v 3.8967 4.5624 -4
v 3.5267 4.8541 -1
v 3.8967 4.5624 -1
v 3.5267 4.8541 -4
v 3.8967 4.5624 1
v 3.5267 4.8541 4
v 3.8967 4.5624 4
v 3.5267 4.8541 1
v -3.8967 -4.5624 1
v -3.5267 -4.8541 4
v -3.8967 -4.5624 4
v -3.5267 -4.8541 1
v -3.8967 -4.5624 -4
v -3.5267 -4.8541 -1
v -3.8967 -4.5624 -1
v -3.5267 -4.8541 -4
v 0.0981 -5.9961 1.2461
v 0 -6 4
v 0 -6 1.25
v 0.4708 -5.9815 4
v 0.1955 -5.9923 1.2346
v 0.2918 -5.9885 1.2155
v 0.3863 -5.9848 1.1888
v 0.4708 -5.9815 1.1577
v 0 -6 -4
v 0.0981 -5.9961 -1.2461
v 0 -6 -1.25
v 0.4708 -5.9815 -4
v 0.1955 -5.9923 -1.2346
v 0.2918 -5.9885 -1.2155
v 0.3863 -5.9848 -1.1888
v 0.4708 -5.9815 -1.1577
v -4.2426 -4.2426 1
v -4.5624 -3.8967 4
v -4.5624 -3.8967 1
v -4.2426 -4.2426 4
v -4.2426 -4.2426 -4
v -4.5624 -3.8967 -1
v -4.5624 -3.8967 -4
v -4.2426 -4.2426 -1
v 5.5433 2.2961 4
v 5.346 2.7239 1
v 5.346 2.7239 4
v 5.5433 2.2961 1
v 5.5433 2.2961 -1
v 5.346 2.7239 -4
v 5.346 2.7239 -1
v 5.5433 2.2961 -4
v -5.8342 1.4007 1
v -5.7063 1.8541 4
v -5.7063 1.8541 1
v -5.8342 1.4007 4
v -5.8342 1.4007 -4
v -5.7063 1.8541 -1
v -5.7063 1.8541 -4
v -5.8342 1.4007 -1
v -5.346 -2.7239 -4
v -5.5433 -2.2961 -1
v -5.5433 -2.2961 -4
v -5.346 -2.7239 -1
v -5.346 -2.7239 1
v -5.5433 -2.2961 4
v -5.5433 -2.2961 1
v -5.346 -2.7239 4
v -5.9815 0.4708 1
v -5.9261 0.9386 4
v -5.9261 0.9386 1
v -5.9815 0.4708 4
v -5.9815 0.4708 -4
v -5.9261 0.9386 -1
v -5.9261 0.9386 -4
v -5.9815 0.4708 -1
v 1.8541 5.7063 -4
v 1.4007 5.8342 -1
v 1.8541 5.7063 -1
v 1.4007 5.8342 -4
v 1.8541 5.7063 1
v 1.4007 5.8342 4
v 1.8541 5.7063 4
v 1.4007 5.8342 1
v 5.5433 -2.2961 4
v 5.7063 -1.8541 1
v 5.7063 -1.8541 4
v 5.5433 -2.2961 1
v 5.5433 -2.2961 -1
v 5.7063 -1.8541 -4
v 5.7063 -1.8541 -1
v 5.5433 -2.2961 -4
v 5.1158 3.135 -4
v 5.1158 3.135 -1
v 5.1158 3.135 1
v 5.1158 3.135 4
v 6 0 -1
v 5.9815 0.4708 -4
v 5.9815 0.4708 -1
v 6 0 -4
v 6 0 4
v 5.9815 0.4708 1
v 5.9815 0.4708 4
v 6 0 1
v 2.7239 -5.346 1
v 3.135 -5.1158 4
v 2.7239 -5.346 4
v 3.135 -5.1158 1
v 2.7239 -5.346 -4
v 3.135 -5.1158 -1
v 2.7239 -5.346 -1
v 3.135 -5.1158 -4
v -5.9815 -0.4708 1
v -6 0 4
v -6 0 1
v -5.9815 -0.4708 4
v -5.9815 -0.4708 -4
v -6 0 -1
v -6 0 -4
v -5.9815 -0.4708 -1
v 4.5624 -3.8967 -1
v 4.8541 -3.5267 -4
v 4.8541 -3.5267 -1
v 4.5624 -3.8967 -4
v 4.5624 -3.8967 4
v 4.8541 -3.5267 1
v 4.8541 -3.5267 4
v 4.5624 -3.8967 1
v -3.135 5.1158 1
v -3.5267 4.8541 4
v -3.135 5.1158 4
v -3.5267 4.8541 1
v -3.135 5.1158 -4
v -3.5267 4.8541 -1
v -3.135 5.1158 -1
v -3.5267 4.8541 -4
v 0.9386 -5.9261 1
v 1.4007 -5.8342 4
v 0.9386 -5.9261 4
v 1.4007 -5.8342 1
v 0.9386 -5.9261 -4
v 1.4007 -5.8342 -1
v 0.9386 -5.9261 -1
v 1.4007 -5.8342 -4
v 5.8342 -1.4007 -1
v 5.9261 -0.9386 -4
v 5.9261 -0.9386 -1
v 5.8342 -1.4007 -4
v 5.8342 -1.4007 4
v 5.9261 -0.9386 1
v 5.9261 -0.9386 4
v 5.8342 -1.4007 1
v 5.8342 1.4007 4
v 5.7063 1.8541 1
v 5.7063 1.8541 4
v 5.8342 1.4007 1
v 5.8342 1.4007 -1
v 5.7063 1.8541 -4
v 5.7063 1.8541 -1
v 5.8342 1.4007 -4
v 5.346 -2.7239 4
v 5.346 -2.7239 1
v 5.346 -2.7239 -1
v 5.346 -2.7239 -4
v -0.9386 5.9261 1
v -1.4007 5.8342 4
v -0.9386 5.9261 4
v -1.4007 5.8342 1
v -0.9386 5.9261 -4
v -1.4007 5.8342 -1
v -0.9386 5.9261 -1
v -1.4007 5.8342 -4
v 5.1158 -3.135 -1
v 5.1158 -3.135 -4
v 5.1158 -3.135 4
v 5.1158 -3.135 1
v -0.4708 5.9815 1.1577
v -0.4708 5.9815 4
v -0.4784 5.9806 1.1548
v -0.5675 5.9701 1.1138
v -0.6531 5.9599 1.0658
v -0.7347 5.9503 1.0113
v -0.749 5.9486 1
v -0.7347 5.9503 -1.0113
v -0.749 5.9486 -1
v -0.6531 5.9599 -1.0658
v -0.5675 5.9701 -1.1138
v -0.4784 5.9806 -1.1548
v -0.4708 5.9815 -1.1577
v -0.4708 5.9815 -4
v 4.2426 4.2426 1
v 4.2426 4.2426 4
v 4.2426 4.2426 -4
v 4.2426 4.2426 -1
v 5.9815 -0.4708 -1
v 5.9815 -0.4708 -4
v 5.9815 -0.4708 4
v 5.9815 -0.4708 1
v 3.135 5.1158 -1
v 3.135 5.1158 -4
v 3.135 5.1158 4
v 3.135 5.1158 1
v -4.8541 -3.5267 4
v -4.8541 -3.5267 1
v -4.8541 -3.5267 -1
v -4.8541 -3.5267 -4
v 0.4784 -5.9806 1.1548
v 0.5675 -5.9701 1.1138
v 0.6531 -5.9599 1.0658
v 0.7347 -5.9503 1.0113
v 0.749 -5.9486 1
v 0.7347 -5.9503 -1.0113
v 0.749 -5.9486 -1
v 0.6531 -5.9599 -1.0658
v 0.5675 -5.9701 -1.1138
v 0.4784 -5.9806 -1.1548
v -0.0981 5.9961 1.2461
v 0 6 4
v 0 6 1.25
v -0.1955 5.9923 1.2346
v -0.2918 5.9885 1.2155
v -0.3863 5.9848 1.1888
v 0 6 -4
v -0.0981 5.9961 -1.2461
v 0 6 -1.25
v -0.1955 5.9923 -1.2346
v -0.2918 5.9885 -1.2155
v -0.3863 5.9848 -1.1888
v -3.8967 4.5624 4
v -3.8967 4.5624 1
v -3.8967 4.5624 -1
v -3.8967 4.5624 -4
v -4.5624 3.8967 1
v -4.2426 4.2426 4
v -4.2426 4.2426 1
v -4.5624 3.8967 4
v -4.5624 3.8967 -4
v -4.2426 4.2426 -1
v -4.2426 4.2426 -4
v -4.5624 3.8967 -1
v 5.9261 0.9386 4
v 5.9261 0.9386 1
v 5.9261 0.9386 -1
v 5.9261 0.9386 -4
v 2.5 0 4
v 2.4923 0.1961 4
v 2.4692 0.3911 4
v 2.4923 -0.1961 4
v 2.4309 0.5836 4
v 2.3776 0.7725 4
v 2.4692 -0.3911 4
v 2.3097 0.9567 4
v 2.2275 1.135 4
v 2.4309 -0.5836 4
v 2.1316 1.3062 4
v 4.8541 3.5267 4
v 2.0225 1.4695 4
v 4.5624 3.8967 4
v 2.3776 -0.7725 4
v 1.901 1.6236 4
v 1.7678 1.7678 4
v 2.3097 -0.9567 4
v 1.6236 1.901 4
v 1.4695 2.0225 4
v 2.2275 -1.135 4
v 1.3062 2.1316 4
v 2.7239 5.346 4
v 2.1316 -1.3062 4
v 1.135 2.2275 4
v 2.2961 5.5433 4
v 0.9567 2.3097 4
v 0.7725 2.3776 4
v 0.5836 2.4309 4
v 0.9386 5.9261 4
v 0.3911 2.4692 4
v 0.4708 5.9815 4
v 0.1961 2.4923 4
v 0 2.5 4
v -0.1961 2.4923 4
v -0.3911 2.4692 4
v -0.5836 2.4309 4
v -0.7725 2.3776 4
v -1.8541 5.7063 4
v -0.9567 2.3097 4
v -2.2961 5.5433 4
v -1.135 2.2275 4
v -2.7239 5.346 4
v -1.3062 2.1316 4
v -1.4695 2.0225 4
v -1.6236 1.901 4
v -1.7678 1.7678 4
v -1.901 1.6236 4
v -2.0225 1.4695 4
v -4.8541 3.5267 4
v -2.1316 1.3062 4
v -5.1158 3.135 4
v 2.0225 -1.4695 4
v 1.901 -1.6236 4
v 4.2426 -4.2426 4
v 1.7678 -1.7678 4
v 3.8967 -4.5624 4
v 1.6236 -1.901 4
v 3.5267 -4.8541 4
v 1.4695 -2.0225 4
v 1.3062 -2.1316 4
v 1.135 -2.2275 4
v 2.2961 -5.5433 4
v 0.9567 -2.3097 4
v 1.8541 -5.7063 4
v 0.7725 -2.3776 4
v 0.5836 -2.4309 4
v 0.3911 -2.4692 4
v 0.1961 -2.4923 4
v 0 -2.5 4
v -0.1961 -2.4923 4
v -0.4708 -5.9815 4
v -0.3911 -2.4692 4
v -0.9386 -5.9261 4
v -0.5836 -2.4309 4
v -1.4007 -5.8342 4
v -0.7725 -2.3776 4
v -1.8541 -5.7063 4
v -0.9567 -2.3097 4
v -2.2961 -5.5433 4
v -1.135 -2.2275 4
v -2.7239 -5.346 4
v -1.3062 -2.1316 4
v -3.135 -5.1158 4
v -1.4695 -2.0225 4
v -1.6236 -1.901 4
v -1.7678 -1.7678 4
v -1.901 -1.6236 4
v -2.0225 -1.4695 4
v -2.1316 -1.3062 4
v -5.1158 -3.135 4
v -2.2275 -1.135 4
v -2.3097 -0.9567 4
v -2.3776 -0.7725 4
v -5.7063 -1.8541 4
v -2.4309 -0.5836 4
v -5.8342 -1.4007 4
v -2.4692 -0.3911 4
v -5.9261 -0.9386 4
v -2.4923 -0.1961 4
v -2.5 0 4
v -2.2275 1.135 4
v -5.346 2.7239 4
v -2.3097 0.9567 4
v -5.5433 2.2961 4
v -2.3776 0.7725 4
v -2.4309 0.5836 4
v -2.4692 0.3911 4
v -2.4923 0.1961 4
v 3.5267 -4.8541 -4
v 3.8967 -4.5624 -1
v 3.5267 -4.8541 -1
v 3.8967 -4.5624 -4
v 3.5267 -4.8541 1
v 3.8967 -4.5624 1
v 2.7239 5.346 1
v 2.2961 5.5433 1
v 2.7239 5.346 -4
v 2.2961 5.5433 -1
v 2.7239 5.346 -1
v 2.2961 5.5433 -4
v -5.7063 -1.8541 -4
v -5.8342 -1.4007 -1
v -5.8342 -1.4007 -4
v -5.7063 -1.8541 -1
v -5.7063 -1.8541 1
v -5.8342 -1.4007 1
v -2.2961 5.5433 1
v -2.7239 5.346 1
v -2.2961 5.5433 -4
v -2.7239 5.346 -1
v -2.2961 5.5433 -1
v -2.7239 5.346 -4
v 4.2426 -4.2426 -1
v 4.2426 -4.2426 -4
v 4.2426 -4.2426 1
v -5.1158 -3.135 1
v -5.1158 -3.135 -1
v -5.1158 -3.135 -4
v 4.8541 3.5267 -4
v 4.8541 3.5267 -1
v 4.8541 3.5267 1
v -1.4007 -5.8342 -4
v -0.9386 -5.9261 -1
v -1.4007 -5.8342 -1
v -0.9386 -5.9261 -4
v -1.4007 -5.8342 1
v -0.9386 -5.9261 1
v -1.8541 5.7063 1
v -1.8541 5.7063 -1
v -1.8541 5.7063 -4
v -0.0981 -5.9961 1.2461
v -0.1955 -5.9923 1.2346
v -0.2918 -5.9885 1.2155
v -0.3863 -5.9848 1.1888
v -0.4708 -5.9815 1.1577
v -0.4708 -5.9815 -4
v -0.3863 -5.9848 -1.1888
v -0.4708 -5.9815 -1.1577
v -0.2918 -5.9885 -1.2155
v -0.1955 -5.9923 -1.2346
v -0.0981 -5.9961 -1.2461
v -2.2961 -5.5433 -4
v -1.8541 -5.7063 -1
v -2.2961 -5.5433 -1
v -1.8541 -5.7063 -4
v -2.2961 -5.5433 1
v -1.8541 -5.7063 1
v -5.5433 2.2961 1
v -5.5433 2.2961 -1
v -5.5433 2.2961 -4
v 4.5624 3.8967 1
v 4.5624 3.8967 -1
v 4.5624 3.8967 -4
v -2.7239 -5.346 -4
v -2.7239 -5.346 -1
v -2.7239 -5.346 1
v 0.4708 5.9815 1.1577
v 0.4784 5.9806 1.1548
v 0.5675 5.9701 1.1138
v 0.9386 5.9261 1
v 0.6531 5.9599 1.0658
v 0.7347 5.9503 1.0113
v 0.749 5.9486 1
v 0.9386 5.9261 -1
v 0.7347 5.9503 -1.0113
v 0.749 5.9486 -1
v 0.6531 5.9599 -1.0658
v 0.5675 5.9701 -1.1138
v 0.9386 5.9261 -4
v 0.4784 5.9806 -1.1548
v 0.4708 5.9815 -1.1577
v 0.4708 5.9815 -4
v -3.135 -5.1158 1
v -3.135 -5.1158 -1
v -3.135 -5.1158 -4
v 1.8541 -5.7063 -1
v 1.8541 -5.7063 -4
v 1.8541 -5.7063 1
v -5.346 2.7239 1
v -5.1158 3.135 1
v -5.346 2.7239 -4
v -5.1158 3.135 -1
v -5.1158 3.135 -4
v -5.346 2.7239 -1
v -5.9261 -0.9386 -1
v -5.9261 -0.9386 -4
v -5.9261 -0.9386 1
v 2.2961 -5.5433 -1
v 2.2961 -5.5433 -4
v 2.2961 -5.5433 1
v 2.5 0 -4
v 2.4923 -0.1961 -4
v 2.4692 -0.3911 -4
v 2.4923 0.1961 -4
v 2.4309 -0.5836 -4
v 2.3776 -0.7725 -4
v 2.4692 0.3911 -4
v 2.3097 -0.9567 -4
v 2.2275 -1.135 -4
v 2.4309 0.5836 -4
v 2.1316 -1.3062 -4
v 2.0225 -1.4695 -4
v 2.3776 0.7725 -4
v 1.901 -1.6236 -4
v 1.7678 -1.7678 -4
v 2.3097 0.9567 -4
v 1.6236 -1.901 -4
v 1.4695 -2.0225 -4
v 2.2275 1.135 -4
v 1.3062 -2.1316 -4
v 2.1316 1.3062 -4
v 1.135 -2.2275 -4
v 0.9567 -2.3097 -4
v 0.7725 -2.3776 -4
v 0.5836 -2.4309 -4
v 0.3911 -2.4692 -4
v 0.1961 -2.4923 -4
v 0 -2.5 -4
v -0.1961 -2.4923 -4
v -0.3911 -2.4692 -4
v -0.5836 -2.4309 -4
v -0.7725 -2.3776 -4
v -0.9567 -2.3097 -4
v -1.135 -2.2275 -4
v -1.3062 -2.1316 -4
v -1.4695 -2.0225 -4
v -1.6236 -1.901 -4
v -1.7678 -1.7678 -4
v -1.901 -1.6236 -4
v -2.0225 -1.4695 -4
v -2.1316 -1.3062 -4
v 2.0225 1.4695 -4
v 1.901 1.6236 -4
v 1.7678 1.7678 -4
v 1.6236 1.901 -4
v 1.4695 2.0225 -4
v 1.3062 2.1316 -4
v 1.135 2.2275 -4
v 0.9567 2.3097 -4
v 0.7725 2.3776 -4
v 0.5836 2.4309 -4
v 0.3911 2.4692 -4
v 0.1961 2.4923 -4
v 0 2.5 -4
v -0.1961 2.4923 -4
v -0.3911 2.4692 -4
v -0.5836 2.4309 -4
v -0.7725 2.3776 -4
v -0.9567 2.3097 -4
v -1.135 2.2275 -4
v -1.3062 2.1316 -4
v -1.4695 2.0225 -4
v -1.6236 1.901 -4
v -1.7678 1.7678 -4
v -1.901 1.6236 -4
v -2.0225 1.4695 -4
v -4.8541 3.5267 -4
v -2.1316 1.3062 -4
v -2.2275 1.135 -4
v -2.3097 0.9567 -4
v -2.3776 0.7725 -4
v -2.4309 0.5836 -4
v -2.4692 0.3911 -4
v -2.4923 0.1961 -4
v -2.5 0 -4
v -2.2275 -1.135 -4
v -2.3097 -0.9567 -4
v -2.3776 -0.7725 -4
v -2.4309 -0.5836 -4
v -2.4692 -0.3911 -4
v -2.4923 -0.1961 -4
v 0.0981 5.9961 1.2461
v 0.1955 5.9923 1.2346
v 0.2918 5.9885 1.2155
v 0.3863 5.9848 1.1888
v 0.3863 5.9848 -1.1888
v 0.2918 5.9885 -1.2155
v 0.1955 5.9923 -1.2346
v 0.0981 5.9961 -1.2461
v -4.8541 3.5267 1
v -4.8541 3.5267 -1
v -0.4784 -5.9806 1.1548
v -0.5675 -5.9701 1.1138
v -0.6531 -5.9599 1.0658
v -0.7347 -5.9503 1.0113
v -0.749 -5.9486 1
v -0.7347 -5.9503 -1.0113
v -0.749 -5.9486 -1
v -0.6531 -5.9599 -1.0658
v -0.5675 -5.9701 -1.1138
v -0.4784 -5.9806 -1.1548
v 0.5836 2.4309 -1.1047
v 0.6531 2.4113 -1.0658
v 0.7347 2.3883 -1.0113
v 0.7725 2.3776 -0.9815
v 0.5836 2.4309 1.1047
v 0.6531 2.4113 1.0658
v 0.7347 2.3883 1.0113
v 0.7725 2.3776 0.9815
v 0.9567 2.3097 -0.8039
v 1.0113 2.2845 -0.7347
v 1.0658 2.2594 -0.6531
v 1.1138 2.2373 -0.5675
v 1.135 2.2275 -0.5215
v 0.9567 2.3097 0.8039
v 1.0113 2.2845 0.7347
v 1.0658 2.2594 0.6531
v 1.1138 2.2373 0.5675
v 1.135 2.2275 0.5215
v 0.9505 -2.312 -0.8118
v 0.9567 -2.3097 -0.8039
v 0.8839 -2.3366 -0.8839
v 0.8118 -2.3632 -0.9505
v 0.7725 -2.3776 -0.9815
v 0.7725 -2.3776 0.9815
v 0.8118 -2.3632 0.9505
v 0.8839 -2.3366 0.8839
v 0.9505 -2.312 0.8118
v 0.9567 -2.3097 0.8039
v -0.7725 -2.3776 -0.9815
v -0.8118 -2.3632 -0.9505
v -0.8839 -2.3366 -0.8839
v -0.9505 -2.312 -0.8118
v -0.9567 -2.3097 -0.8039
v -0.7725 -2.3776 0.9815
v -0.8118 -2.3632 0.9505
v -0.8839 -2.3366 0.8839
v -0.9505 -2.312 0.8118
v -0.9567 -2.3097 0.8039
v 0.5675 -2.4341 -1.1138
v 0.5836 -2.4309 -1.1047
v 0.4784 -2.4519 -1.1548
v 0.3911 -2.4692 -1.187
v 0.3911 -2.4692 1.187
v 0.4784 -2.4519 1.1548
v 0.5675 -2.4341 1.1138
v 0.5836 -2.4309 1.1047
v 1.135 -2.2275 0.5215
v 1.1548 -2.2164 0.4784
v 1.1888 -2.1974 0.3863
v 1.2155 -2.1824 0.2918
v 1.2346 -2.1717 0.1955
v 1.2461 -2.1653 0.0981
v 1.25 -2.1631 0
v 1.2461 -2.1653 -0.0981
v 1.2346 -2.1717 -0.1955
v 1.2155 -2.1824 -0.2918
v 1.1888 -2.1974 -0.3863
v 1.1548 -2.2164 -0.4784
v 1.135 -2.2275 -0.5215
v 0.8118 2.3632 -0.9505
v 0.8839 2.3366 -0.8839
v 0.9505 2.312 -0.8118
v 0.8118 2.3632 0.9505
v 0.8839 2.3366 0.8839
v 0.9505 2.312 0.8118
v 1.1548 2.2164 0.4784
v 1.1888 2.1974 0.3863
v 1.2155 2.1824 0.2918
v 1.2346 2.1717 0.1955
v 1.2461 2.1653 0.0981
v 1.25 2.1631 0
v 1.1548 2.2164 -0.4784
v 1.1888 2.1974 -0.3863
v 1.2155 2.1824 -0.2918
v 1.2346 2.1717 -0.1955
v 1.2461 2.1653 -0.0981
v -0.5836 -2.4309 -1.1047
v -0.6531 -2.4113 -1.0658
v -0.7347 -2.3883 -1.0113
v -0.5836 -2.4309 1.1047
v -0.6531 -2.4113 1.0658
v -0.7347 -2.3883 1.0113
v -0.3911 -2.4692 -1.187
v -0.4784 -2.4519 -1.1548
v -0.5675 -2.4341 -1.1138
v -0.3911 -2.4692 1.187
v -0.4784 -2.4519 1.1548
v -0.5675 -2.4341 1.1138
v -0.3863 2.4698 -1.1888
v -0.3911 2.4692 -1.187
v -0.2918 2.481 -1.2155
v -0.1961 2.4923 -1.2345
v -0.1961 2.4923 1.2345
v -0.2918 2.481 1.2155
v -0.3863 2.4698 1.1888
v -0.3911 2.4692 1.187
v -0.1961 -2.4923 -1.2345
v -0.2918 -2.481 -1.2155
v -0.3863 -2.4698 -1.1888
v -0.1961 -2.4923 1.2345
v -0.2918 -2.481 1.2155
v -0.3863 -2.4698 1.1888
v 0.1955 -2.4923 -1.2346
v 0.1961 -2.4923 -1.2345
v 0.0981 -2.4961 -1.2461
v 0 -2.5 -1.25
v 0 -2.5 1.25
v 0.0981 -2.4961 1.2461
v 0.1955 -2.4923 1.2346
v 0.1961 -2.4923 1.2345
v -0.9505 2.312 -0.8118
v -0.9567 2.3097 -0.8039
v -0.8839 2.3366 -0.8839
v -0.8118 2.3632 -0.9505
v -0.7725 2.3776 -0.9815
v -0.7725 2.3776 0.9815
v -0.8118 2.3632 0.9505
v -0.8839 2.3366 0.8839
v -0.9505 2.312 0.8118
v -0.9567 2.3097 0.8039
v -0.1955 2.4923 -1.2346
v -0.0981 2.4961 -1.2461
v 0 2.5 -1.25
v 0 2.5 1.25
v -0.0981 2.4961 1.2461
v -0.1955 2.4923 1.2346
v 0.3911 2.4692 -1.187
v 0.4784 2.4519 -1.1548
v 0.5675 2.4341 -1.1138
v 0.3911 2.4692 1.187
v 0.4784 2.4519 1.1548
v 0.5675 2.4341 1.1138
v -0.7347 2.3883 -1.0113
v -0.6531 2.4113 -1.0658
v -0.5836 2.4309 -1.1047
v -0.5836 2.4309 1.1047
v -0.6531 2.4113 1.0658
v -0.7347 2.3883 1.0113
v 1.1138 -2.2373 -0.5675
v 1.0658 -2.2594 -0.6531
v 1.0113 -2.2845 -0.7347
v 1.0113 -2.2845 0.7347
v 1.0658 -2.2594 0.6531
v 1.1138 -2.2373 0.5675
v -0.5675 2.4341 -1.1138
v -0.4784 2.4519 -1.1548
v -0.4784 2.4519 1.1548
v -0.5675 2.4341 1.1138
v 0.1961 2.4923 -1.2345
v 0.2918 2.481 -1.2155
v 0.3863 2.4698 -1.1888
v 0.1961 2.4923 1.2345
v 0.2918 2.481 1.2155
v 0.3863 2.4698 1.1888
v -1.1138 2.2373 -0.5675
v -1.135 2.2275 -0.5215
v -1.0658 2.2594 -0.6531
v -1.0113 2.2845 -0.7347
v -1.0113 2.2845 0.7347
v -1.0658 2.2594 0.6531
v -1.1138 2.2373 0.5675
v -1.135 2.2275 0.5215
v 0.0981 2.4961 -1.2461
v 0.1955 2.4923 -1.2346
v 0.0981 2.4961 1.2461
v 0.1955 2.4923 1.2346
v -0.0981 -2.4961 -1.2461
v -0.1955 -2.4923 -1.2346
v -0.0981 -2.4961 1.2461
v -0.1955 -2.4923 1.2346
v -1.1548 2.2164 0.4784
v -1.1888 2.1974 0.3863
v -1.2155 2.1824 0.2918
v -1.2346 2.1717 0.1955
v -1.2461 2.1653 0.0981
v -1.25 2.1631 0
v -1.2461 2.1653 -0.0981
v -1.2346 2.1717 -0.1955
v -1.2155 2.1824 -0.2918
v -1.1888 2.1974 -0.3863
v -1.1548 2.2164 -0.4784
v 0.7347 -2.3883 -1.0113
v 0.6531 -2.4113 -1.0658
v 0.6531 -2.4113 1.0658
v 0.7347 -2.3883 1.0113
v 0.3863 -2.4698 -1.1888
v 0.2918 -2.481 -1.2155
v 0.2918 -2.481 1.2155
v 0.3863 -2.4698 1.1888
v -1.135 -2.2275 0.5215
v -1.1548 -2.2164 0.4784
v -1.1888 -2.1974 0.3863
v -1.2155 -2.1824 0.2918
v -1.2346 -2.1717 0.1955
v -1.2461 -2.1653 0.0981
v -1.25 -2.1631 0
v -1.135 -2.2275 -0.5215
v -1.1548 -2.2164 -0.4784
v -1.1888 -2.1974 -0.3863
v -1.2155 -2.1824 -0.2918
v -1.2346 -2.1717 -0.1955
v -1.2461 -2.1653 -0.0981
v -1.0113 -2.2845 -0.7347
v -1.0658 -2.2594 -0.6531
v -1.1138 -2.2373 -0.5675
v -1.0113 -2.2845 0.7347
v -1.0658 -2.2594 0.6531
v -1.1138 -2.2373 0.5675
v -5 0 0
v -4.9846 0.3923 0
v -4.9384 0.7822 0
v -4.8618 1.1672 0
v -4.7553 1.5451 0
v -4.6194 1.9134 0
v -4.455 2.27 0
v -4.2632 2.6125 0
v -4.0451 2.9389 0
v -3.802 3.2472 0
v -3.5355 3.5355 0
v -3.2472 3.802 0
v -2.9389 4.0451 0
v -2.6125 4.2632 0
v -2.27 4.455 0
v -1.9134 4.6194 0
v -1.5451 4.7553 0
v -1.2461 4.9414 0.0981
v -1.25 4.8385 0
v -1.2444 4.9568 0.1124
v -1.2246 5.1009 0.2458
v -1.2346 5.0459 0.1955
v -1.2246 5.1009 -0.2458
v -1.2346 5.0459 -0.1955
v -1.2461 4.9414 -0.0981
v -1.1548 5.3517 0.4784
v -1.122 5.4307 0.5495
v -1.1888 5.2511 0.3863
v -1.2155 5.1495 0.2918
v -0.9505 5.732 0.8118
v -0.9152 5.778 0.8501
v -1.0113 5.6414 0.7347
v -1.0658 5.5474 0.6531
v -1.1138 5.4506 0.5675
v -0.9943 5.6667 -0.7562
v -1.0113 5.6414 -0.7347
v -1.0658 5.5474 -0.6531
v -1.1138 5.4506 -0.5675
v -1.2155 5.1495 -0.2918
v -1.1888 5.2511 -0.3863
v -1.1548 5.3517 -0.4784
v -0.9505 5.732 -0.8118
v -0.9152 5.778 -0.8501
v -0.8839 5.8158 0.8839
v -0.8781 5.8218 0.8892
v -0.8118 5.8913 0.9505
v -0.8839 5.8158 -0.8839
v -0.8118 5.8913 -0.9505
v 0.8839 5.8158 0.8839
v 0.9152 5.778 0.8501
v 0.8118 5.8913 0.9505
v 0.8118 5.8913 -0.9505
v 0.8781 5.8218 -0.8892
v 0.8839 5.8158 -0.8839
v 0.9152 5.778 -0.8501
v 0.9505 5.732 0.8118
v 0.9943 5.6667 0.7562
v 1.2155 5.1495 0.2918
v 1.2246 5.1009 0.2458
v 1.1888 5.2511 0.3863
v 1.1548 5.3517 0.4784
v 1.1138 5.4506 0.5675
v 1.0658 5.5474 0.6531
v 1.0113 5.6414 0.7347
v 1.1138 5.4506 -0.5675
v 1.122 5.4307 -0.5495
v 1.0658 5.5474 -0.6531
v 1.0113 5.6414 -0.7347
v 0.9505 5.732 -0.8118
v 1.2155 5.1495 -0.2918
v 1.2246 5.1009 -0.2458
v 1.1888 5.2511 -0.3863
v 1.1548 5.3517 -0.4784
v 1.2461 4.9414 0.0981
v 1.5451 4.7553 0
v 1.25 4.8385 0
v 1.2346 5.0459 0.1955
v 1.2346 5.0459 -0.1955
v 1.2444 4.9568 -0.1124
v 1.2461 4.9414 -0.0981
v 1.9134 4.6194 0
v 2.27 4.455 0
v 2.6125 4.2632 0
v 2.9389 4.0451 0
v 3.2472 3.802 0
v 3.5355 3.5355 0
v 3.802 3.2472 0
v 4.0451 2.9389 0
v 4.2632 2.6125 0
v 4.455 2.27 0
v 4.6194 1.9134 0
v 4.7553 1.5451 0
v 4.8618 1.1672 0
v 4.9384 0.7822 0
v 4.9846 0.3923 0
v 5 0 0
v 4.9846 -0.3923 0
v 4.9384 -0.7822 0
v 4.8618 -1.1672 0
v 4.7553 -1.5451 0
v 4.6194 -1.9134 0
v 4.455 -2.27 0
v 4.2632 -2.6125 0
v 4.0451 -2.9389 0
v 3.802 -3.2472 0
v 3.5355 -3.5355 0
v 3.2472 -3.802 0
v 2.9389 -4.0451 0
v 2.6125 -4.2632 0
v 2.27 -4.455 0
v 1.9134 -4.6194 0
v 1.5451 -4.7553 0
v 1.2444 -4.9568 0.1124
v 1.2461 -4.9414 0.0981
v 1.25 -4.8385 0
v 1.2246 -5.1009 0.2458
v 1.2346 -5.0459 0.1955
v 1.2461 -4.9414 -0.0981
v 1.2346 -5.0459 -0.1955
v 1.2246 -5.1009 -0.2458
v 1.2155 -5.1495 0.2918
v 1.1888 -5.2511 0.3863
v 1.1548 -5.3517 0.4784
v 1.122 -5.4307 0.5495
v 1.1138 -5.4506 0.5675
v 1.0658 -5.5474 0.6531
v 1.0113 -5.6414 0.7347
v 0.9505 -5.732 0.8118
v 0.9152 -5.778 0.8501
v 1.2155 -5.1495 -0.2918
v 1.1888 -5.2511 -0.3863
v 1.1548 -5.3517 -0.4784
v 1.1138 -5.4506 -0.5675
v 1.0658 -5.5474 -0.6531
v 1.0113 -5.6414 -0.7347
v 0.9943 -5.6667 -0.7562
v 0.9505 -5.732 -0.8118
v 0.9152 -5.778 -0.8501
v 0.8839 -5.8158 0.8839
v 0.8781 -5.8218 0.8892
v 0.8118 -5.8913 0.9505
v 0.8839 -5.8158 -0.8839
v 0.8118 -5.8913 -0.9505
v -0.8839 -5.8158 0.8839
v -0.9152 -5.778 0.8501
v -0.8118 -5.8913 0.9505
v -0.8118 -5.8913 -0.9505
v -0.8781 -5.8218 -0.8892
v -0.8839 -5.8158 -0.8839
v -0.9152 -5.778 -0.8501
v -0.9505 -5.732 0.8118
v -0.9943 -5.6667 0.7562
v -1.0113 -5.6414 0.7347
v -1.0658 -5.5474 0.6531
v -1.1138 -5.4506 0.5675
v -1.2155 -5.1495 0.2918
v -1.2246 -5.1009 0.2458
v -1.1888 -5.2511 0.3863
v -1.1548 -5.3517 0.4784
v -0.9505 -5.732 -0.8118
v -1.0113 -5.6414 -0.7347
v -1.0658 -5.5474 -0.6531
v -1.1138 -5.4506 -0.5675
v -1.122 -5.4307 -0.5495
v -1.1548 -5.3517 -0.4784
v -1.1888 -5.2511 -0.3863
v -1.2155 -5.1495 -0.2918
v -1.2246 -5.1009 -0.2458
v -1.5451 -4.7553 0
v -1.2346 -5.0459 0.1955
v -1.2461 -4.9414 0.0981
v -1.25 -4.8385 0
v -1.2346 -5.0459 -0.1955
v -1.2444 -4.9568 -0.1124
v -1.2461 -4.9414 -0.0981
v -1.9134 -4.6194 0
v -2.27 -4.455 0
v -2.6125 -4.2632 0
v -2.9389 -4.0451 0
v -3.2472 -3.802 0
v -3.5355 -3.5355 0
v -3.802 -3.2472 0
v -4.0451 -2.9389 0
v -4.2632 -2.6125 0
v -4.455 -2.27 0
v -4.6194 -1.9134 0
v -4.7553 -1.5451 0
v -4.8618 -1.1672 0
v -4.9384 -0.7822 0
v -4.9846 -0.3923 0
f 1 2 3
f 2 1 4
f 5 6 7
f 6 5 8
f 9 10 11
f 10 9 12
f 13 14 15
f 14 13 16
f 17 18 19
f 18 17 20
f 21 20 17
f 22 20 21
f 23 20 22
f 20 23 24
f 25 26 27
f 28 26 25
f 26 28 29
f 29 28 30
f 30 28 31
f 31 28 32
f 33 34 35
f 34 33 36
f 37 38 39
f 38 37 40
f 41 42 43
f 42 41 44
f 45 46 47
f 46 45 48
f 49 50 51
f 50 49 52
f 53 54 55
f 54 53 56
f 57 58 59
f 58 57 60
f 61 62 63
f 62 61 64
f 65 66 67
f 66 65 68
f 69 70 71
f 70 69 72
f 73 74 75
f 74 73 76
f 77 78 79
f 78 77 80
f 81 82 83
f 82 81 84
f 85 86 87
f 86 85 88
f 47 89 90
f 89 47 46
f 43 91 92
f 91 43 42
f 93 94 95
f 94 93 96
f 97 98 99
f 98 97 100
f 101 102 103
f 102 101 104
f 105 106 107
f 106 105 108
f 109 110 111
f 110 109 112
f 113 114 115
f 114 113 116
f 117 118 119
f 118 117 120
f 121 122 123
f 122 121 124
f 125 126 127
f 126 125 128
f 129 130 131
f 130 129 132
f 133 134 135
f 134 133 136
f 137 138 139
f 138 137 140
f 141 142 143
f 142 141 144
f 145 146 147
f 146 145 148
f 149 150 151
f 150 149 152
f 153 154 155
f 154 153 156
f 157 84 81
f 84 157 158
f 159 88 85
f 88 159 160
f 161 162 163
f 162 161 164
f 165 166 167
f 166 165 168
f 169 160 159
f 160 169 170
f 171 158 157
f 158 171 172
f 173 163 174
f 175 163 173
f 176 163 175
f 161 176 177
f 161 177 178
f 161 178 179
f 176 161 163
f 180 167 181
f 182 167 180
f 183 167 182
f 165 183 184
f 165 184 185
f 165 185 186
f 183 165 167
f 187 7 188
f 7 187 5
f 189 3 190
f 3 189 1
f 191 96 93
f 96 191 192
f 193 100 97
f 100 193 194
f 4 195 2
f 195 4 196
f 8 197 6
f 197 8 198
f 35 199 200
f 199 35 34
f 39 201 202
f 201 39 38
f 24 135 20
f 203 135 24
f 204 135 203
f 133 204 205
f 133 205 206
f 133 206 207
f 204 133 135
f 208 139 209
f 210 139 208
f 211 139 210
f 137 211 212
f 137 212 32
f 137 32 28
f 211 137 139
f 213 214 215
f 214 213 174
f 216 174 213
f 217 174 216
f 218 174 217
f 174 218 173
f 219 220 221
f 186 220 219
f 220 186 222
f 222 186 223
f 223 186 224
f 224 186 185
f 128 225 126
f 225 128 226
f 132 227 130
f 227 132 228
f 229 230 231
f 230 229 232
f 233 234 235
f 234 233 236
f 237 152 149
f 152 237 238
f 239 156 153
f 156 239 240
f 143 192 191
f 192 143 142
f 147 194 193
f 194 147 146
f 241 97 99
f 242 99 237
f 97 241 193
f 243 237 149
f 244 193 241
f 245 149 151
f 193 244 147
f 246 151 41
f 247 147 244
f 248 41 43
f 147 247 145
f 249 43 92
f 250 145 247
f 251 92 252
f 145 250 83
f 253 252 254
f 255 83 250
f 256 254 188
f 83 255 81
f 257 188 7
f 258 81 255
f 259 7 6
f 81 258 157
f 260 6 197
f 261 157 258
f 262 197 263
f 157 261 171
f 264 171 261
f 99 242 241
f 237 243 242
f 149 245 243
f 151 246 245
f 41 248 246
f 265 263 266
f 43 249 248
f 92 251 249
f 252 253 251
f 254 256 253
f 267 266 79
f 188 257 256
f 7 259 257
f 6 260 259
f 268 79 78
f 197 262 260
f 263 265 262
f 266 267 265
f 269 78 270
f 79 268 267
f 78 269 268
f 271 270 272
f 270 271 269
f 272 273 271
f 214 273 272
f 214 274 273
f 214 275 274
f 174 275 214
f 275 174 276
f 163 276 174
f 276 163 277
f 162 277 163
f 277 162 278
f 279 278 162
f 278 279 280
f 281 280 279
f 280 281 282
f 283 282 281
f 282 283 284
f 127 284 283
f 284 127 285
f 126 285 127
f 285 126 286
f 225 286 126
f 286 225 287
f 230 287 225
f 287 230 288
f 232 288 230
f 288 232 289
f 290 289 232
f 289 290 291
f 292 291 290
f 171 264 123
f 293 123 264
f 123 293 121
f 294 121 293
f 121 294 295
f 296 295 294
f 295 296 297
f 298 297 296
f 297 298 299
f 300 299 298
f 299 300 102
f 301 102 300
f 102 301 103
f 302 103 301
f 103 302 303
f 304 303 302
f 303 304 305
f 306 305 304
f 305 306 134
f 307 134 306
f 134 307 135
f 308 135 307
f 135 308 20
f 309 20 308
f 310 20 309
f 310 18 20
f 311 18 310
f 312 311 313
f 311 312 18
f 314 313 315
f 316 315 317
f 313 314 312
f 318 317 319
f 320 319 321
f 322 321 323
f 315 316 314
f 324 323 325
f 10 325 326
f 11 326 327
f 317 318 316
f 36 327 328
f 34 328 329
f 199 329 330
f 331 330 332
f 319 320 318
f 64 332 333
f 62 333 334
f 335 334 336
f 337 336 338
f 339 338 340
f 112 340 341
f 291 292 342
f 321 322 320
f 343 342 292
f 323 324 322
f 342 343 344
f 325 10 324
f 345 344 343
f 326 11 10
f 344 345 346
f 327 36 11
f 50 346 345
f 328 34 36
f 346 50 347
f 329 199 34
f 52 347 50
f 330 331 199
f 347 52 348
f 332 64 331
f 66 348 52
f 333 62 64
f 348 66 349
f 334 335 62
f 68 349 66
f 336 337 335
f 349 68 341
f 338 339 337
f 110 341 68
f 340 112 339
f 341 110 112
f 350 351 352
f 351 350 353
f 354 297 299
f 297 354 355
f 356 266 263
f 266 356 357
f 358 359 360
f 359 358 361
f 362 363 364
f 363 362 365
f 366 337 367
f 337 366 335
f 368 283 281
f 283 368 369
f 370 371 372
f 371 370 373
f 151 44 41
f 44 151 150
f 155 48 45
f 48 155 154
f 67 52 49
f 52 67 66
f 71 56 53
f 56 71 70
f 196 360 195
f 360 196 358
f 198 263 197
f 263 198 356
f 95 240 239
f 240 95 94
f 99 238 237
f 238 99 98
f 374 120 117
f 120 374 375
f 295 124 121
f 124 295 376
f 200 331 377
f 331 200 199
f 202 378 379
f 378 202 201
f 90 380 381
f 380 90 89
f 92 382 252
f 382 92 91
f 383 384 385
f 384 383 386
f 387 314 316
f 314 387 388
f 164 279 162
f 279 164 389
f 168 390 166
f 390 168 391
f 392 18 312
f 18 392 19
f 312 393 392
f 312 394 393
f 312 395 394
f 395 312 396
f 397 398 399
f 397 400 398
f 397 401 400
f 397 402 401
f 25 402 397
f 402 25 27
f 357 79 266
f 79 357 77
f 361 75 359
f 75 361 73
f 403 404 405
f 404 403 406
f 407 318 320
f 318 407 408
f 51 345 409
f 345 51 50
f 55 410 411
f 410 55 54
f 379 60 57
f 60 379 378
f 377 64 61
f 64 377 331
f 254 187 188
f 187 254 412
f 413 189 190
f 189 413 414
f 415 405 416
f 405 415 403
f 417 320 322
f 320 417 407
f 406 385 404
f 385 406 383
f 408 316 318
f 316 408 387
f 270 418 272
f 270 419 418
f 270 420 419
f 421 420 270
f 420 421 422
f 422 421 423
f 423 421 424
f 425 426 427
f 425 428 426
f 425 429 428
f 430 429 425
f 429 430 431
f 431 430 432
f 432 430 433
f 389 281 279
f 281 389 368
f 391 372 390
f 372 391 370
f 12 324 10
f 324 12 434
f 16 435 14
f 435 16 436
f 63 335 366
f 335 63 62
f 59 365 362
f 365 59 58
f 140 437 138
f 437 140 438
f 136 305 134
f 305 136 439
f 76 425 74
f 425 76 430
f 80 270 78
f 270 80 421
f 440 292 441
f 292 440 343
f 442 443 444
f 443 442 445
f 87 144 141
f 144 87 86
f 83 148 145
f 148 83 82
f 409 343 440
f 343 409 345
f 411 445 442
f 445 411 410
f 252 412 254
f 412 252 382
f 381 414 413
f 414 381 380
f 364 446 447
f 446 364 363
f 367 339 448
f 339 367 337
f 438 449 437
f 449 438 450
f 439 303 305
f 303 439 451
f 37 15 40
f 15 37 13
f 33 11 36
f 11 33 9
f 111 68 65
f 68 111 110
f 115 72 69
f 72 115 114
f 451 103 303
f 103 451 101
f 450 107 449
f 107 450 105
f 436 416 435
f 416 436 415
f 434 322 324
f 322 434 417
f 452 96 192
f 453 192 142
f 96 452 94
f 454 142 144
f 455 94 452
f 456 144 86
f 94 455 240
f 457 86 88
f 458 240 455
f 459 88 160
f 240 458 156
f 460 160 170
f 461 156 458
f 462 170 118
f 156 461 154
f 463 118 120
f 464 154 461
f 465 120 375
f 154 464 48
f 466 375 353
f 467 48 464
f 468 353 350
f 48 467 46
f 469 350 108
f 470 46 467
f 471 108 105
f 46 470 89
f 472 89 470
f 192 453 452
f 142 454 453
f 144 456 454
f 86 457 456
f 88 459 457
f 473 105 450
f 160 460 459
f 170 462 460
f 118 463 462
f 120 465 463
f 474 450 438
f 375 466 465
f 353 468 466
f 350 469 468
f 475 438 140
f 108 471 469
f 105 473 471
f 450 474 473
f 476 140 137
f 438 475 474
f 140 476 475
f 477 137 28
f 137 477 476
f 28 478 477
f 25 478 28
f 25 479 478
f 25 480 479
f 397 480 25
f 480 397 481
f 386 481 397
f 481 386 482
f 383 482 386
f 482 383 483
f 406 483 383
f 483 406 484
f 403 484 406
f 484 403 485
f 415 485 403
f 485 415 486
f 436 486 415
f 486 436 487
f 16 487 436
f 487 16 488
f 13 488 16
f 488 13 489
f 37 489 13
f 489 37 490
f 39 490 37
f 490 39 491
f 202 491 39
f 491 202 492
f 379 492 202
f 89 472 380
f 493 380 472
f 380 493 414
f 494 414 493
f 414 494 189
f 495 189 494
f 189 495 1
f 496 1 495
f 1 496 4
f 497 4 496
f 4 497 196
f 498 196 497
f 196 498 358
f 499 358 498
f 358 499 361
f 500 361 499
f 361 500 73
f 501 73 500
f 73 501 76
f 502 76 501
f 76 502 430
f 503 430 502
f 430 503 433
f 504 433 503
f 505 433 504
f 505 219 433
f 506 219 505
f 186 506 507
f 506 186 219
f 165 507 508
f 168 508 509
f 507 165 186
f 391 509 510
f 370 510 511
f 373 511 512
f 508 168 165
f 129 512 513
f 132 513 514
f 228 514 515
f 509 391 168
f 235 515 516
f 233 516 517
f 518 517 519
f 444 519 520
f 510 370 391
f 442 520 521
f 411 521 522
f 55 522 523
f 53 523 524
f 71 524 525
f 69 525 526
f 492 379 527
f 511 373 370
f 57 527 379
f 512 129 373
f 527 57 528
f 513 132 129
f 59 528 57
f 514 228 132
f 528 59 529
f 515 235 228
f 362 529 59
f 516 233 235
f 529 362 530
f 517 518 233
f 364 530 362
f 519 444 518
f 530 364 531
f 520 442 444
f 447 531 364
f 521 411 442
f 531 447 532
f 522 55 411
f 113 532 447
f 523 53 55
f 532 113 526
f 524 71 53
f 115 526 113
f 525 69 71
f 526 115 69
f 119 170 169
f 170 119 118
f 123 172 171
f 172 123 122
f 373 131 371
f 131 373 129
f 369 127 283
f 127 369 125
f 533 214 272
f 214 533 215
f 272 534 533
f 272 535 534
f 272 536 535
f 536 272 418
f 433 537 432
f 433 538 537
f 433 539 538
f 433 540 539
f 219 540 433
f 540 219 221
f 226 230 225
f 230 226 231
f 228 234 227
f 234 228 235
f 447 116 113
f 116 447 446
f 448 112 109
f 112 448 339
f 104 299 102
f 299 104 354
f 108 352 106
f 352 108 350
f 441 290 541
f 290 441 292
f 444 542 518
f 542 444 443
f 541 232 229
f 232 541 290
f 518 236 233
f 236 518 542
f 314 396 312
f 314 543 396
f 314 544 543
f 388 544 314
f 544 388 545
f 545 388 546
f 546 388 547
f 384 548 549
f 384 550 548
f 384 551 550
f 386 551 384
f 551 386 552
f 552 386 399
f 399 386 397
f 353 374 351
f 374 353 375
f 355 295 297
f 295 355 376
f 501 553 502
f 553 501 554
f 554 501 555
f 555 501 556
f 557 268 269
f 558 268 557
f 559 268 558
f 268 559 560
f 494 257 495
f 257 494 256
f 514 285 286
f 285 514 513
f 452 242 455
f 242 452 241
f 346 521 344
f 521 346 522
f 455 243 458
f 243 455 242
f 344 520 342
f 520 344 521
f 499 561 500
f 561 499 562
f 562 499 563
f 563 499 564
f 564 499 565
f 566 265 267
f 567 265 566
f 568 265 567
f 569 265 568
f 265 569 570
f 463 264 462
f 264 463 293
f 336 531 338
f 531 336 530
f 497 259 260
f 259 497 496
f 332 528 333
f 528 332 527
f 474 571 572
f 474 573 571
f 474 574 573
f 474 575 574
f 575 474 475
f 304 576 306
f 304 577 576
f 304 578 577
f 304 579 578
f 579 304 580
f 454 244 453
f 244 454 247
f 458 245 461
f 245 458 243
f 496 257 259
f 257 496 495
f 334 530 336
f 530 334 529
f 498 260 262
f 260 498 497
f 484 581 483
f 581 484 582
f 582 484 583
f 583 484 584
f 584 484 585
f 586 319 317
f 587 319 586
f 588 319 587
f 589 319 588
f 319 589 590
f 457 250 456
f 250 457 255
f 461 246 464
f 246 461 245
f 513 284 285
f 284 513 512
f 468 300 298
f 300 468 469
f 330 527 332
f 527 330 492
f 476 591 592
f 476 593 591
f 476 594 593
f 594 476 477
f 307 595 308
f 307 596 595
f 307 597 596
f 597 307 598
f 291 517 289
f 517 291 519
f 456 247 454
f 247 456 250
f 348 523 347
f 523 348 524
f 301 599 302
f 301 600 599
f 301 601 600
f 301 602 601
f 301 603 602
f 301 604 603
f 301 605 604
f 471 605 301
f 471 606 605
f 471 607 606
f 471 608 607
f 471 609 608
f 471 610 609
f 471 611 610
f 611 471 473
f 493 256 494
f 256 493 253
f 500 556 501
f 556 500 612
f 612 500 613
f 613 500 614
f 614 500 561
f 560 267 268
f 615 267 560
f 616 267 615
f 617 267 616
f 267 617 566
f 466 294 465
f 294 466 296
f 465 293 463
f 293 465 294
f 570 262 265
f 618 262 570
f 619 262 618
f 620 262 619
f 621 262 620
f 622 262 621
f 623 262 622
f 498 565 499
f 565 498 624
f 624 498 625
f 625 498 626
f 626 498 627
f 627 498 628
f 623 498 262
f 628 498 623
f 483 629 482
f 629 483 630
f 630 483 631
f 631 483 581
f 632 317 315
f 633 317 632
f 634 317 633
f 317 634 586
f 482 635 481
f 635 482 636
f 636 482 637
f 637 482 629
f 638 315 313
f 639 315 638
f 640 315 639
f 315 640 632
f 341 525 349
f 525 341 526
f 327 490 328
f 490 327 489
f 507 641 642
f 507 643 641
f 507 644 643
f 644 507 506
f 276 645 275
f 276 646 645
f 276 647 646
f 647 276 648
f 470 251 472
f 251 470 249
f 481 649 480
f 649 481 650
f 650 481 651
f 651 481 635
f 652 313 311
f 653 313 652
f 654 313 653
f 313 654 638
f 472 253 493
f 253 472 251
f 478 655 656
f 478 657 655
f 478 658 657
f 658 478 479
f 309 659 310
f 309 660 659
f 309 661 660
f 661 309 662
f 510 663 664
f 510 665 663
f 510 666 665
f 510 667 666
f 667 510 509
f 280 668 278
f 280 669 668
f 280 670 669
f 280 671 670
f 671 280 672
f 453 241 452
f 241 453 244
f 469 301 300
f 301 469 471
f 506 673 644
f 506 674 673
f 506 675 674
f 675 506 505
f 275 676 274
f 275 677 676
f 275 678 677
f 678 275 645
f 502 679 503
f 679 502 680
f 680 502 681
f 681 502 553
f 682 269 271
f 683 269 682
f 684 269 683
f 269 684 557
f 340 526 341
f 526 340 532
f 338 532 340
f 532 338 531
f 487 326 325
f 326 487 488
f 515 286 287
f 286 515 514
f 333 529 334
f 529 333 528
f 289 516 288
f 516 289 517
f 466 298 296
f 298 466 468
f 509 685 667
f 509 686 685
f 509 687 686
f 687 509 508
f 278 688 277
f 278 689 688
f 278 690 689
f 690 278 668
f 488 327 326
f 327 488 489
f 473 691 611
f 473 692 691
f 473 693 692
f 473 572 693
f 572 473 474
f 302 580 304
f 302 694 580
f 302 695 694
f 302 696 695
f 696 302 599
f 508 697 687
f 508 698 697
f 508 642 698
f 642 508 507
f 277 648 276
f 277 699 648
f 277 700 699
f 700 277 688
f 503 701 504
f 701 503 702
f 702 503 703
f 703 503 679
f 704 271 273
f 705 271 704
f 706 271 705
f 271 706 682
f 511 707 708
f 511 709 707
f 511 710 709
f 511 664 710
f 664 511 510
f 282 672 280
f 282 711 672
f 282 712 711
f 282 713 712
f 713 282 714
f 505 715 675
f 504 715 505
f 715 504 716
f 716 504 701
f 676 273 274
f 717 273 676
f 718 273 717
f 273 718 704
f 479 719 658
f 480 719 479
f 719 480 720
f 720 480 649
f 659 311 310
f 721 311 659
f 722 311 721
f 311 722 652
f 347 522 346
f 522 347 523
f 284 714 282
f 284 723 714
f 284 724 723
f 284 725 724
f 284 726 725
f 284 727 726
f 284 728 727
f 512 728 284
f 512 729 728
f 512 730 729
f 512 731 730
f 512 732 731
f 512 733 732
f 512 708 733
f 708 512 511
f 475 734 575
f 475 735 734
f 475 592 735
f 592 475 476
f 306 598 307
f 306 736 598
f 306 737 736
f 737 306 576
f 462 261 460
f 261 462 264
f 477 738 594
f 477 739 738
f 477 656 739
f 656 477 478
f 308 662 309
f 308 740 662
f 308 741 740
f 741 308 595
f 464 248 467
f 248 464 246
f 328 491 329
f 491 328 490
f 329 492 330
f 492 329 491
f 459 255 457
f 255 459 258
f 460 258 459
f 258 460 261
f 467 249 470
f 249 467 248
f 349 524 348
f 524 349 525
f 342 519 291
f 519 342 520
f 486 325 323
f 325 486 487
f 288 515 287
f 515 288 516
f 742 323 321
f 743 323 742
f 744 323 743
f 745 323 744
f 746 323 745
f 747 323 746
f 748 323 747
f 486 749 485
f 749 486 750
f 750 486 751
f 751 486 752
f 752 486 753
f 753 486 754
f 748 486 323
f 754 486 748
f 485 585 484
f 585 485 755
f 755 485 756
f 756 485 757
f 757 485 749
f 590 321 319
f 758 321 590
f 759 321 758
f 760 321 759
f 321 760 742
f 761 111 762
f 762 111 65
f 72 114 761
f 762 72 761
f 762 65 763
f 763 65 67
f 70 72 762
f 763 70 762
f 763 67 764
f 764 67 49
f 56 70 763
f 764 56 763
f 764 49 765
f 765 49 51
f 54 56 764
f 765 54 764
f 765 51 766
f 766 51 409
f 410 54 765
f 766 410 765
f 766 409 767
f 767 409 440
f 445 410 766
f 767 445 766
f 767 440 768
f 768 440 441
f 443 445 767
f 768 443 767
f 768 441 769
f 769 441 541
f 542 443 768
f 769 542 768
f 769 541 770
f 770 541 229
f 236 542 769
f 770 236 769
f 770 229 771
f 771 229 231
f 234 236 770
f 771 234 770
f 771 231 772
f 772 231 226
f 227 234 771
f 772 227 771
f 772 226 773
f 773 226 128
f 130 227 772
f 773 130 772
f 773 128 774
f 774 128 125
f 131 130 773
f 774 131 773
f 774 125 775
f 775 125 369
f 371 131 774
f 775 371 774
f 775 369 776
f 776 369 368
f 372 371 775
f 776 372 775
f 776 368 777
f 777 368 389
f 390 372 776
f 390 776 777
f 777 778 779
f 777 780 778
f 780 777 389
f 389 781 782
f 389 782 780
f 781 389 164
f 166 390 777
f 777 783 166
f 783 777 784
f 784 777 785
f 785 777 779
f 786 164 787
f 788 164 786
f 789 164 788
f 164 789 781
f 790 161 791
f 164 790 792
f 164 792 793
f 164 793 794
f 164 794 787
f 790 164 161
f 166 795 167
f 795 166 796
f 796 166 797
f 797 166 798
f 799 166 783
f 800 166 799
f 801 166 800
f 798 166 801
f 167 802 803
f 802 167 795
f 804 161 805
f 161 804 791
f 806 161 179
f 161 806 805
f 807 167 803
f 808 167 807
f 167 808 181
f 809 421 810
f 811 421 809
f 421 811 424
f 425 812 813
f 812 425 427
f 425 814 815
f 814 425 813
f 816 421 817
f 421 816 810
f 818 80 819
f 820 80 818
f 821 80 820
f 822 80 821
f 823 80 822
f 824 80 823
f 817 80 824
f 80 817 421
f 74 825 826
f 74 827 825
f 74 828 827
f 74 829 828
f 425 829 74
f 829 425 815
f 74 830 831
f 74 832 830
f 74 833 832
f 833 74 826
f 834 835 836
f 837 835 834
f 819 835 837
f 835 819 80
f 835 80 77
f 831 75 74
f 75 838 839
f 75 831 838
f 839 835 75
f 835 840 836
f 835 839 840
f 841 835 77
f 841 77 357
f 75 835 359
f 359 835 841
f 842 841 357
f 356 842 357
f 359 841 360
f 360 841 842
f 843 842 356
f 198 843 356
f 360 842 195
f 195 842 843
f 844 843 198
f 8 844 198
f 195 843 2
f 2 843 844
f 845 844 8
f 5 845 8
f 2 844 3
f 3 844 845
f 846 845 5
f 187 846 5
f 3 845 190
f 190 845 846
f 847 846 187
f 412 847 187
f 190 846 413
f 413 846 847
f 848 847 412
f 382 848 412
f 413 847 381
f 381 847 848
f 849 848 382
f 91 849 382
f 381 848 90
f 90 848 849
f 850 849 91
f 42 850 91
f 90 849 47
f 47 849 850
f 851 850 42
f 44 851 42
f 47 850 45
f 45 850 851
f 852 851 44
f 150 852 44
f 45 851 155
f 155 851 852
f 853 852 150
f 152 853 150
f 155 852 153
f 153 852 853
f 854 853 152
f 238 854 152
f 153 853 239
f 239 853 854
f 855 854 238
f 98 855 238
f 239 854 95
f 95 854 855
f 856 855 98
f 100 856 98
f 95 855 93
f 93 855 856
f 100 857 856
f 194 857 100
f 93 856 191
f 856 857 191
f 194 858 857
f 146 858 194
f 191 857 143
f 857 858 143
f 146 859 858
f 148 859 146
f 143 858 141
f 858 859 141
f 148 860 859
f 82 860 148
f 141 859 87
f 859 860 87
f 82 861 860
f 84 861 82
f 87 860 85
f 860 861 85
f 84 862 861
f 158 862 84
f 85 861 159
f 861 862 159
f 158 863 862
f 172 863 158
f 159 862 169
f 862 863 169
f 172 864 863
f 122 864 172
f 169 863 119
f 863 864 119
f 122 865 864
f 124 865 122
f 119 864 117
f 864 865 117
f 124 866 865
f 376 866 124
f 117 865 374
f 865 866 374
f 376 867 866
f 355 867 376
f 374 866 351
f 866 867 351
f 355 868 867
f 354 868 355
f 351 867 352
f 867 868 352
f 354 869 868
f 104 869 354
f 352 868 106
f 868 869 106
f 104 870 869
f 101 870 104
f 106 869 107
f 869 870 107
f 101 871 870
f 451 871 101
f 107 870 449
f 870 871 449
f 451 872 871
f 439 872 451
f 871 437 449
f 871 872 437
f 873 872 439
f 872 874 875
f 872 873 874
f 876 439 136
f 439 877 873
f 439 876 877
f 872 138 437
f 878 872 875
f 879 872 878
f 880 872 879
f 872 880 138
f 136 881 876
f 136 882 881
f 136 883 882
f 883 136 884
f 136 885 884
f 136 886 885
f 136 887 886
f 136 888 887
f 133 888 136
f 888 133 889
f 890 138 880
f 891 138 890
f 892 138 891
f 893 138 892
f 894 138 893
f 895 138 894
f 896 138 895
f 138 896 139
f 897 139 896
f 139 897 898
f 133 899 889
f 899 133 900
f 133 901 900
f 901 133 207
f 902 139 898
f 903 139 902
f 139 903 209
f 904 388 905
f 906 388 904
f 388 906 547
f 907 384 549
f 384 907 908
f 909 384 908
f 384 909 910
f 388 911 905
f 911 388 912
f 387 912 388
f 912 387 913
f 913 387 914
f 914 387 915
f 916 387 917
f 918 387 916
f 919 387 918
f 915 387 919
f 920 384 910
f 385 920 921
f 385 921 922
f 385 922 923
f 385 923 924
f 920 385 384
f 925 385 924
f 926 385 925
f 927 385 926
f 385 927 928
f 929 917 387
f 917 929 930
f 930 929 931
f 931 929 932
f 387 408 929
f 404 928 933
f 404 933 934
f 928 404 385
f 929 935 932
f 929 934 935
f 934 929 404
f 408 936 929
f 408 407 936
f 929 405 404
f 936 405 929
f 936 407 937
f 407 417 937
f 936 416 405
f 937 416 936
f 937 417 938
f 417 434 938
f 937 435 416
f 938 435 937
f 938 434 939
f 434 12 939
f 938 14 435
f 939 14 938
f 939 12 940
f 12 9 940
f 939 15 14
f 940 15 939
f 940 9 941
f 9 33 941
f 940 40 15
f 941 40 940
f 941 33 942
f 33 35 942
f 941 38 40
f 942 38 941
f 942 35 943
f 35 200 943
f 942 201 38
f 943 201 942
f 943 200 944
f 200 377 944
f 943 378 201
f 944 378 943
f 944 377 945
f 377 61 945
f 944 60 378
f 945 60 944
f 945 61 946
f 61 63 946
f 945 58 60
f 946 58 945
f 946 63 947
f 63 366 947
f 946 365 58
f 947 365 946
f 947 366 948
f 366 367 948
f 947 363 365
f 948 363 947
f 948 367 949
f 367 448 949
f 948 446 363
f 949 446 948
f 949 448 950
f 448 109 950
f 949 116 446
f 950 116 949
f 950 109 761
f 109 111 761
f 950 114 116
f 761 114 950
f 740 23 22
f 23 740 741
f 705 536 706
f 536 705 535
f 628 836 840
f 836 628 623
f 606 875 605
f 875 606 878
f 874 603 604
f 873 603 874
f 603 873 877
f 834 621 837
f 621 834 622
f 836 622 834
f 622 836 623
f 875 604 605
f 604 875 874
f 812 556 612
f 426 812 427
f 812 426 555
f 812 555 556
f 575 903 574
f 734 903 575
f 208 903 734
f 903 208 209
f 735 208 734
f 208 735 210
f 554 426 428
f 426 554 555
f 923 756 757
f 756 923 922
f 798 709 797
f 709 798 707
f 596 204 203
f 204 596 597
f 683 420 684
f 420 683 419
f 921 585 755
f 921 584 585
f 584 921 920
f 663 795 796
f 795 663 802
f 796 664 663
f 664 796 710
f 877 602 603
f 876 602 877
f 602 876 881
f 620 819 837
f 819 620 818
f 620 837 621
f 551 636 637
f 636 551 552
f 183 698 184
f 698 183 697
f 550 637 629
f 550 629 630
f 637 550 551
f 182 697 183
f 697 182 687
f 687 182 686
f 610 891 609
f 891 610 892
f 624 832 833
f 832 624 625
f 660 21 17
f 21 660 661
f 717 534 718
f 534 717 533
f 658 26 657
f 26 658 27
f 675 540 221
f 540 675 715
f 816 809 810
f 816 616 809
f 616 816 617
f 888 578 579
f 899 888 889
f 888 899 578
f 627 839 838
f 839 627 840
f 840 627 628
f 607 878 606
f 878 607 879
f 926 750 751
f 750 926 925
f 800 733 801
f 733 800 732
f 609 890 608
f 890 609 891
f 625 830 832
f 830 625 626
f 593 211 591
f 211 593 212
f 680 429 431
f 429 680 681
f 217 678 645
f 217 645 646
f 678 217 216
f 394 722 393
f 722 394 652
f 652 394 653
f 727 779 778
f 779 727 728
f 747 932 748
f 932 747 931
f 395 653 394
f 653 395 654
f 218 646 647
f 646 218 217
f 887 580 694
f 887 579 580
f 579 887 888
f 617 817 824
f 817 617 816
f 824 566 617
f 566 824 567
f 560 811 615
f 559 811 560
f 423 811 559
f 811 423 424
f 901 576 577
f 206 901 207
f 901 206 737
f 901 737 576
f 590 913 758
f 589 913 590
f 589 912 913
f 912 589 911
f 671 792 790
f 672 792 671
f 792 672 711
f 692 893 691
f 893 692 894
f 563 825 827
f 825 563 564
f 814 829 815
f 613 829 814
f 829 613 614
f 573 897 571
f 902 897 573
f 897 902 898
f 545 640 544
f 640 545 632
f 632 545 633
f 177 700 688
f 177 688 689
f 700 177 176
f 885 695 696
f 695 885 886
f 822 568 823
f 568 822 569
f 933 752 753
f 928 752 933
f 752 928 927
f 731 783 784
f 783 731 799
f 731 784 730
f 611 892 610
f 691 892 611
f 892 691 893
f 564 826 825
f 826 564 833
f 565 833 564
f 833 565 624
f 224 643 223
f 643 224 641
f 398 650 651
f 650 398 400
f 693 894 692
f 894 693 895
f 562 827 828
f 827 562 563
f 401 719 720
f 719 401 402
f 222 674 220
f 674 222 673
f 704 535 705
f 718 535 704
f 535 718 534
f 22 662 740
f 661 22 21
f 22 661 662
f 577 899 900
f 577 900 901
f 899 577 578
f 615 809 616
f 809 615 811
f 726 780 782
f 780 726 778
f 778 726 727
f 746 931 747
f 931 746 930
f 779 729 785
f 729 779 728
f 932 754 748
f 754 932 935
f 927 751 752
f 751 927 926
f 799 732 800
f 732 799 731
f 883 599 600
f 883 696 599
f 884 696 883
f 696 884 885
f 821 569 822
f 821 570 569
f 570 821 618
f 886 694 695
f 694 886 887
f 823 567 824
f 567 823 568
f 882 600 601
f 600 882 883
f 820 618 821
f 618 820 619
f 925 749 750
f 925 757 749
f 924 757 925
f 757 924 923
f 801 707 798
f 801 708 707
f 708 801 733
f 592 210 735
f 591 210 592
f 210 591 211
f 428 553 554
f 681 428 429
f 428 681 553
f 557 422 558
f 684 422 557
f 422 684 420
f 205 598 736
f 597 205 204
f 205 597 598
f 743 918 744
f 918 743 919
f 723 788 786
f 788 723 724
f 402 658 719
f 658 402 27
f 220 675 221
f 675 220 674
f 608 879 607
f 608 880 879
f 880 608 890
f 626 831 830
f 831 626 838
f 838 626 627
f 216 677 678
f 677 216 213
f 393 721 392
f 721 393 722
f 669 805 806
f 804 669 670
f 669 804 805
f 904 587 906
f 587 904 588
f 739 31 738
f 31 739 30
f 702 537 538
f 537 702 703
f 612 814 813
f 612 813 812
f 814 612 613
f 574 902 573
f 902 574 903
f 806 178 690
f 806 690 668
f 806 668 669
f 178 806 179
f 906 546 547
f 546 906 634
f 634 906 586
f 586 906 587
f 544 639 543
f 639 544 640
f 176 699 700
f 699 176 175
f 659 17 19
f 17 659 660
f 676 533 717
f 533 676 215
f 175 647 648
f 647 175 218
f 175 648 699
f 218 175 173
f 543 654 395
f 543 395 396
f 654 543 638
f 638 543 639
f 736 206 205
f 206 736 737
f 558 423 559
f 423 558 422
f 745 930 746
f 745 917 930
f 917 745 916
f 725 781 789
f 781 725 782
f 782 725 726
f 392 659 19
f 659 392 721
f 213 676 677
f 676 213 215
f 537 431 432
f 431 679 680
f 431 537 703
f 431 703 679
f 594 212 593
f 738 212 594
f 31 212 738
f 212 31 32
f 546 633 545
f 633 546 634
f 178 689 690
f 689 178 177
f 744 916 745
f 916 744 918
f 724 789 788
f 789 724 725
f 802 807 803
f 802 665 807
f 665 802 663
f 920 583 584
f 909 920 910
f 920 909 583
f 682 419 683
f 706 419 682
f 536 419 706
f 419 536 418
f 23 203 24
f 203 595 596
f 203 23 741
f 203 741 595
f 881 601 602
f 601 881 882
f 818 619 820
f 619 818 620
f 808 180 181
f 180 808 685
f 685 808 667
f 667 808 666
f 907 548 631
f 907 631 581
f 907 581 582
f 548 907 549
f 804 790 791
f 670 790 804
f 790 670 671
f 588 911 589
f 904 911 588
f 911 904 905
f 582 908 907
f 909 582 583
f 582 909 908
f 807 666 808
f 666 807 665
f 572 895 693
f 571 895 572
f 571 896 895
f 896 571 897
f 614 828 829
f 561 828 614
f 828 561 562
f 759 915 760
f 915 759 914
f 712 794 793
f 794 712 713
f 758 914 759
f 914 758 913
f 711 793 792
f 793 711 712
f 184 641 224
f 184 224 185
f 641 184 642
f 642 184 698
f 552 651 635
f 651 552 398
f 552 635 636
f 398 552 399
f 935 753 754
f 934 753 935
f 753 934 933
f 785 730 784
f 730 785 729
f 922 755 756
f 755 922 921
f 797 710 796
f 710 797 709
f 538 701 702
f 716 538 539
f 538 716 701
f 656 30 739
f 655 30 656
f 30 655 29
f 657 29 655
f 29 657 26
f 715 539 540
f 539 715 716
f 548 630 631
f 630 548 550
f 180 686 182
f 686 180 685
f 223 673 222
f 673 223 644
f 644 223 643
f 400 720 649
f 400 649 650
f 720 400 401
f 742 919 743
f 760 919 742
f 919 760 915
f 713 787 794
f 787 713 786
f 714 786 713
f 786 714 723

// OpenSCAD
// Project Delta Pen (DP-1) - V-Groove Stepper Drive Gear
// Designed to clamp onto a 5mm NEMA 8 stepper shaft and grip TIG filler wire.

$fn = 80;

gear_diameter = 12;
gear_thickness = 8;
bore_diameter = 5.0; // standard motor shaft
groove_depth = 1.0;
groove_angle = 90; // 90 degree V-groove

module drive_gear() {
    difference() {
        // Outer wheel body
        cylinder(h=gear_thickness, d=gear_diameter, center=true);
        
        // Motor shaft bore
        cylinder(h=gear_thickness + 2, d=bore_diameter, center=true);
        
        // V-Groove path for the wire
        rotate_extrude() {
            translate([gear_diameter/2, 0, 0])
                rotate([0, 0, 45])
                    square([groove_depth * sqrt(2), groove_depth * sqrt(2)], center=true);
        }
        
        // Set screw M3 thread hole
        translate([0, 0, 0])
            rotate([90, 0, 0])
                cylinder(h=gear_diameter + 2, d=2.5, center=true);
    }
}

drive_gear();
